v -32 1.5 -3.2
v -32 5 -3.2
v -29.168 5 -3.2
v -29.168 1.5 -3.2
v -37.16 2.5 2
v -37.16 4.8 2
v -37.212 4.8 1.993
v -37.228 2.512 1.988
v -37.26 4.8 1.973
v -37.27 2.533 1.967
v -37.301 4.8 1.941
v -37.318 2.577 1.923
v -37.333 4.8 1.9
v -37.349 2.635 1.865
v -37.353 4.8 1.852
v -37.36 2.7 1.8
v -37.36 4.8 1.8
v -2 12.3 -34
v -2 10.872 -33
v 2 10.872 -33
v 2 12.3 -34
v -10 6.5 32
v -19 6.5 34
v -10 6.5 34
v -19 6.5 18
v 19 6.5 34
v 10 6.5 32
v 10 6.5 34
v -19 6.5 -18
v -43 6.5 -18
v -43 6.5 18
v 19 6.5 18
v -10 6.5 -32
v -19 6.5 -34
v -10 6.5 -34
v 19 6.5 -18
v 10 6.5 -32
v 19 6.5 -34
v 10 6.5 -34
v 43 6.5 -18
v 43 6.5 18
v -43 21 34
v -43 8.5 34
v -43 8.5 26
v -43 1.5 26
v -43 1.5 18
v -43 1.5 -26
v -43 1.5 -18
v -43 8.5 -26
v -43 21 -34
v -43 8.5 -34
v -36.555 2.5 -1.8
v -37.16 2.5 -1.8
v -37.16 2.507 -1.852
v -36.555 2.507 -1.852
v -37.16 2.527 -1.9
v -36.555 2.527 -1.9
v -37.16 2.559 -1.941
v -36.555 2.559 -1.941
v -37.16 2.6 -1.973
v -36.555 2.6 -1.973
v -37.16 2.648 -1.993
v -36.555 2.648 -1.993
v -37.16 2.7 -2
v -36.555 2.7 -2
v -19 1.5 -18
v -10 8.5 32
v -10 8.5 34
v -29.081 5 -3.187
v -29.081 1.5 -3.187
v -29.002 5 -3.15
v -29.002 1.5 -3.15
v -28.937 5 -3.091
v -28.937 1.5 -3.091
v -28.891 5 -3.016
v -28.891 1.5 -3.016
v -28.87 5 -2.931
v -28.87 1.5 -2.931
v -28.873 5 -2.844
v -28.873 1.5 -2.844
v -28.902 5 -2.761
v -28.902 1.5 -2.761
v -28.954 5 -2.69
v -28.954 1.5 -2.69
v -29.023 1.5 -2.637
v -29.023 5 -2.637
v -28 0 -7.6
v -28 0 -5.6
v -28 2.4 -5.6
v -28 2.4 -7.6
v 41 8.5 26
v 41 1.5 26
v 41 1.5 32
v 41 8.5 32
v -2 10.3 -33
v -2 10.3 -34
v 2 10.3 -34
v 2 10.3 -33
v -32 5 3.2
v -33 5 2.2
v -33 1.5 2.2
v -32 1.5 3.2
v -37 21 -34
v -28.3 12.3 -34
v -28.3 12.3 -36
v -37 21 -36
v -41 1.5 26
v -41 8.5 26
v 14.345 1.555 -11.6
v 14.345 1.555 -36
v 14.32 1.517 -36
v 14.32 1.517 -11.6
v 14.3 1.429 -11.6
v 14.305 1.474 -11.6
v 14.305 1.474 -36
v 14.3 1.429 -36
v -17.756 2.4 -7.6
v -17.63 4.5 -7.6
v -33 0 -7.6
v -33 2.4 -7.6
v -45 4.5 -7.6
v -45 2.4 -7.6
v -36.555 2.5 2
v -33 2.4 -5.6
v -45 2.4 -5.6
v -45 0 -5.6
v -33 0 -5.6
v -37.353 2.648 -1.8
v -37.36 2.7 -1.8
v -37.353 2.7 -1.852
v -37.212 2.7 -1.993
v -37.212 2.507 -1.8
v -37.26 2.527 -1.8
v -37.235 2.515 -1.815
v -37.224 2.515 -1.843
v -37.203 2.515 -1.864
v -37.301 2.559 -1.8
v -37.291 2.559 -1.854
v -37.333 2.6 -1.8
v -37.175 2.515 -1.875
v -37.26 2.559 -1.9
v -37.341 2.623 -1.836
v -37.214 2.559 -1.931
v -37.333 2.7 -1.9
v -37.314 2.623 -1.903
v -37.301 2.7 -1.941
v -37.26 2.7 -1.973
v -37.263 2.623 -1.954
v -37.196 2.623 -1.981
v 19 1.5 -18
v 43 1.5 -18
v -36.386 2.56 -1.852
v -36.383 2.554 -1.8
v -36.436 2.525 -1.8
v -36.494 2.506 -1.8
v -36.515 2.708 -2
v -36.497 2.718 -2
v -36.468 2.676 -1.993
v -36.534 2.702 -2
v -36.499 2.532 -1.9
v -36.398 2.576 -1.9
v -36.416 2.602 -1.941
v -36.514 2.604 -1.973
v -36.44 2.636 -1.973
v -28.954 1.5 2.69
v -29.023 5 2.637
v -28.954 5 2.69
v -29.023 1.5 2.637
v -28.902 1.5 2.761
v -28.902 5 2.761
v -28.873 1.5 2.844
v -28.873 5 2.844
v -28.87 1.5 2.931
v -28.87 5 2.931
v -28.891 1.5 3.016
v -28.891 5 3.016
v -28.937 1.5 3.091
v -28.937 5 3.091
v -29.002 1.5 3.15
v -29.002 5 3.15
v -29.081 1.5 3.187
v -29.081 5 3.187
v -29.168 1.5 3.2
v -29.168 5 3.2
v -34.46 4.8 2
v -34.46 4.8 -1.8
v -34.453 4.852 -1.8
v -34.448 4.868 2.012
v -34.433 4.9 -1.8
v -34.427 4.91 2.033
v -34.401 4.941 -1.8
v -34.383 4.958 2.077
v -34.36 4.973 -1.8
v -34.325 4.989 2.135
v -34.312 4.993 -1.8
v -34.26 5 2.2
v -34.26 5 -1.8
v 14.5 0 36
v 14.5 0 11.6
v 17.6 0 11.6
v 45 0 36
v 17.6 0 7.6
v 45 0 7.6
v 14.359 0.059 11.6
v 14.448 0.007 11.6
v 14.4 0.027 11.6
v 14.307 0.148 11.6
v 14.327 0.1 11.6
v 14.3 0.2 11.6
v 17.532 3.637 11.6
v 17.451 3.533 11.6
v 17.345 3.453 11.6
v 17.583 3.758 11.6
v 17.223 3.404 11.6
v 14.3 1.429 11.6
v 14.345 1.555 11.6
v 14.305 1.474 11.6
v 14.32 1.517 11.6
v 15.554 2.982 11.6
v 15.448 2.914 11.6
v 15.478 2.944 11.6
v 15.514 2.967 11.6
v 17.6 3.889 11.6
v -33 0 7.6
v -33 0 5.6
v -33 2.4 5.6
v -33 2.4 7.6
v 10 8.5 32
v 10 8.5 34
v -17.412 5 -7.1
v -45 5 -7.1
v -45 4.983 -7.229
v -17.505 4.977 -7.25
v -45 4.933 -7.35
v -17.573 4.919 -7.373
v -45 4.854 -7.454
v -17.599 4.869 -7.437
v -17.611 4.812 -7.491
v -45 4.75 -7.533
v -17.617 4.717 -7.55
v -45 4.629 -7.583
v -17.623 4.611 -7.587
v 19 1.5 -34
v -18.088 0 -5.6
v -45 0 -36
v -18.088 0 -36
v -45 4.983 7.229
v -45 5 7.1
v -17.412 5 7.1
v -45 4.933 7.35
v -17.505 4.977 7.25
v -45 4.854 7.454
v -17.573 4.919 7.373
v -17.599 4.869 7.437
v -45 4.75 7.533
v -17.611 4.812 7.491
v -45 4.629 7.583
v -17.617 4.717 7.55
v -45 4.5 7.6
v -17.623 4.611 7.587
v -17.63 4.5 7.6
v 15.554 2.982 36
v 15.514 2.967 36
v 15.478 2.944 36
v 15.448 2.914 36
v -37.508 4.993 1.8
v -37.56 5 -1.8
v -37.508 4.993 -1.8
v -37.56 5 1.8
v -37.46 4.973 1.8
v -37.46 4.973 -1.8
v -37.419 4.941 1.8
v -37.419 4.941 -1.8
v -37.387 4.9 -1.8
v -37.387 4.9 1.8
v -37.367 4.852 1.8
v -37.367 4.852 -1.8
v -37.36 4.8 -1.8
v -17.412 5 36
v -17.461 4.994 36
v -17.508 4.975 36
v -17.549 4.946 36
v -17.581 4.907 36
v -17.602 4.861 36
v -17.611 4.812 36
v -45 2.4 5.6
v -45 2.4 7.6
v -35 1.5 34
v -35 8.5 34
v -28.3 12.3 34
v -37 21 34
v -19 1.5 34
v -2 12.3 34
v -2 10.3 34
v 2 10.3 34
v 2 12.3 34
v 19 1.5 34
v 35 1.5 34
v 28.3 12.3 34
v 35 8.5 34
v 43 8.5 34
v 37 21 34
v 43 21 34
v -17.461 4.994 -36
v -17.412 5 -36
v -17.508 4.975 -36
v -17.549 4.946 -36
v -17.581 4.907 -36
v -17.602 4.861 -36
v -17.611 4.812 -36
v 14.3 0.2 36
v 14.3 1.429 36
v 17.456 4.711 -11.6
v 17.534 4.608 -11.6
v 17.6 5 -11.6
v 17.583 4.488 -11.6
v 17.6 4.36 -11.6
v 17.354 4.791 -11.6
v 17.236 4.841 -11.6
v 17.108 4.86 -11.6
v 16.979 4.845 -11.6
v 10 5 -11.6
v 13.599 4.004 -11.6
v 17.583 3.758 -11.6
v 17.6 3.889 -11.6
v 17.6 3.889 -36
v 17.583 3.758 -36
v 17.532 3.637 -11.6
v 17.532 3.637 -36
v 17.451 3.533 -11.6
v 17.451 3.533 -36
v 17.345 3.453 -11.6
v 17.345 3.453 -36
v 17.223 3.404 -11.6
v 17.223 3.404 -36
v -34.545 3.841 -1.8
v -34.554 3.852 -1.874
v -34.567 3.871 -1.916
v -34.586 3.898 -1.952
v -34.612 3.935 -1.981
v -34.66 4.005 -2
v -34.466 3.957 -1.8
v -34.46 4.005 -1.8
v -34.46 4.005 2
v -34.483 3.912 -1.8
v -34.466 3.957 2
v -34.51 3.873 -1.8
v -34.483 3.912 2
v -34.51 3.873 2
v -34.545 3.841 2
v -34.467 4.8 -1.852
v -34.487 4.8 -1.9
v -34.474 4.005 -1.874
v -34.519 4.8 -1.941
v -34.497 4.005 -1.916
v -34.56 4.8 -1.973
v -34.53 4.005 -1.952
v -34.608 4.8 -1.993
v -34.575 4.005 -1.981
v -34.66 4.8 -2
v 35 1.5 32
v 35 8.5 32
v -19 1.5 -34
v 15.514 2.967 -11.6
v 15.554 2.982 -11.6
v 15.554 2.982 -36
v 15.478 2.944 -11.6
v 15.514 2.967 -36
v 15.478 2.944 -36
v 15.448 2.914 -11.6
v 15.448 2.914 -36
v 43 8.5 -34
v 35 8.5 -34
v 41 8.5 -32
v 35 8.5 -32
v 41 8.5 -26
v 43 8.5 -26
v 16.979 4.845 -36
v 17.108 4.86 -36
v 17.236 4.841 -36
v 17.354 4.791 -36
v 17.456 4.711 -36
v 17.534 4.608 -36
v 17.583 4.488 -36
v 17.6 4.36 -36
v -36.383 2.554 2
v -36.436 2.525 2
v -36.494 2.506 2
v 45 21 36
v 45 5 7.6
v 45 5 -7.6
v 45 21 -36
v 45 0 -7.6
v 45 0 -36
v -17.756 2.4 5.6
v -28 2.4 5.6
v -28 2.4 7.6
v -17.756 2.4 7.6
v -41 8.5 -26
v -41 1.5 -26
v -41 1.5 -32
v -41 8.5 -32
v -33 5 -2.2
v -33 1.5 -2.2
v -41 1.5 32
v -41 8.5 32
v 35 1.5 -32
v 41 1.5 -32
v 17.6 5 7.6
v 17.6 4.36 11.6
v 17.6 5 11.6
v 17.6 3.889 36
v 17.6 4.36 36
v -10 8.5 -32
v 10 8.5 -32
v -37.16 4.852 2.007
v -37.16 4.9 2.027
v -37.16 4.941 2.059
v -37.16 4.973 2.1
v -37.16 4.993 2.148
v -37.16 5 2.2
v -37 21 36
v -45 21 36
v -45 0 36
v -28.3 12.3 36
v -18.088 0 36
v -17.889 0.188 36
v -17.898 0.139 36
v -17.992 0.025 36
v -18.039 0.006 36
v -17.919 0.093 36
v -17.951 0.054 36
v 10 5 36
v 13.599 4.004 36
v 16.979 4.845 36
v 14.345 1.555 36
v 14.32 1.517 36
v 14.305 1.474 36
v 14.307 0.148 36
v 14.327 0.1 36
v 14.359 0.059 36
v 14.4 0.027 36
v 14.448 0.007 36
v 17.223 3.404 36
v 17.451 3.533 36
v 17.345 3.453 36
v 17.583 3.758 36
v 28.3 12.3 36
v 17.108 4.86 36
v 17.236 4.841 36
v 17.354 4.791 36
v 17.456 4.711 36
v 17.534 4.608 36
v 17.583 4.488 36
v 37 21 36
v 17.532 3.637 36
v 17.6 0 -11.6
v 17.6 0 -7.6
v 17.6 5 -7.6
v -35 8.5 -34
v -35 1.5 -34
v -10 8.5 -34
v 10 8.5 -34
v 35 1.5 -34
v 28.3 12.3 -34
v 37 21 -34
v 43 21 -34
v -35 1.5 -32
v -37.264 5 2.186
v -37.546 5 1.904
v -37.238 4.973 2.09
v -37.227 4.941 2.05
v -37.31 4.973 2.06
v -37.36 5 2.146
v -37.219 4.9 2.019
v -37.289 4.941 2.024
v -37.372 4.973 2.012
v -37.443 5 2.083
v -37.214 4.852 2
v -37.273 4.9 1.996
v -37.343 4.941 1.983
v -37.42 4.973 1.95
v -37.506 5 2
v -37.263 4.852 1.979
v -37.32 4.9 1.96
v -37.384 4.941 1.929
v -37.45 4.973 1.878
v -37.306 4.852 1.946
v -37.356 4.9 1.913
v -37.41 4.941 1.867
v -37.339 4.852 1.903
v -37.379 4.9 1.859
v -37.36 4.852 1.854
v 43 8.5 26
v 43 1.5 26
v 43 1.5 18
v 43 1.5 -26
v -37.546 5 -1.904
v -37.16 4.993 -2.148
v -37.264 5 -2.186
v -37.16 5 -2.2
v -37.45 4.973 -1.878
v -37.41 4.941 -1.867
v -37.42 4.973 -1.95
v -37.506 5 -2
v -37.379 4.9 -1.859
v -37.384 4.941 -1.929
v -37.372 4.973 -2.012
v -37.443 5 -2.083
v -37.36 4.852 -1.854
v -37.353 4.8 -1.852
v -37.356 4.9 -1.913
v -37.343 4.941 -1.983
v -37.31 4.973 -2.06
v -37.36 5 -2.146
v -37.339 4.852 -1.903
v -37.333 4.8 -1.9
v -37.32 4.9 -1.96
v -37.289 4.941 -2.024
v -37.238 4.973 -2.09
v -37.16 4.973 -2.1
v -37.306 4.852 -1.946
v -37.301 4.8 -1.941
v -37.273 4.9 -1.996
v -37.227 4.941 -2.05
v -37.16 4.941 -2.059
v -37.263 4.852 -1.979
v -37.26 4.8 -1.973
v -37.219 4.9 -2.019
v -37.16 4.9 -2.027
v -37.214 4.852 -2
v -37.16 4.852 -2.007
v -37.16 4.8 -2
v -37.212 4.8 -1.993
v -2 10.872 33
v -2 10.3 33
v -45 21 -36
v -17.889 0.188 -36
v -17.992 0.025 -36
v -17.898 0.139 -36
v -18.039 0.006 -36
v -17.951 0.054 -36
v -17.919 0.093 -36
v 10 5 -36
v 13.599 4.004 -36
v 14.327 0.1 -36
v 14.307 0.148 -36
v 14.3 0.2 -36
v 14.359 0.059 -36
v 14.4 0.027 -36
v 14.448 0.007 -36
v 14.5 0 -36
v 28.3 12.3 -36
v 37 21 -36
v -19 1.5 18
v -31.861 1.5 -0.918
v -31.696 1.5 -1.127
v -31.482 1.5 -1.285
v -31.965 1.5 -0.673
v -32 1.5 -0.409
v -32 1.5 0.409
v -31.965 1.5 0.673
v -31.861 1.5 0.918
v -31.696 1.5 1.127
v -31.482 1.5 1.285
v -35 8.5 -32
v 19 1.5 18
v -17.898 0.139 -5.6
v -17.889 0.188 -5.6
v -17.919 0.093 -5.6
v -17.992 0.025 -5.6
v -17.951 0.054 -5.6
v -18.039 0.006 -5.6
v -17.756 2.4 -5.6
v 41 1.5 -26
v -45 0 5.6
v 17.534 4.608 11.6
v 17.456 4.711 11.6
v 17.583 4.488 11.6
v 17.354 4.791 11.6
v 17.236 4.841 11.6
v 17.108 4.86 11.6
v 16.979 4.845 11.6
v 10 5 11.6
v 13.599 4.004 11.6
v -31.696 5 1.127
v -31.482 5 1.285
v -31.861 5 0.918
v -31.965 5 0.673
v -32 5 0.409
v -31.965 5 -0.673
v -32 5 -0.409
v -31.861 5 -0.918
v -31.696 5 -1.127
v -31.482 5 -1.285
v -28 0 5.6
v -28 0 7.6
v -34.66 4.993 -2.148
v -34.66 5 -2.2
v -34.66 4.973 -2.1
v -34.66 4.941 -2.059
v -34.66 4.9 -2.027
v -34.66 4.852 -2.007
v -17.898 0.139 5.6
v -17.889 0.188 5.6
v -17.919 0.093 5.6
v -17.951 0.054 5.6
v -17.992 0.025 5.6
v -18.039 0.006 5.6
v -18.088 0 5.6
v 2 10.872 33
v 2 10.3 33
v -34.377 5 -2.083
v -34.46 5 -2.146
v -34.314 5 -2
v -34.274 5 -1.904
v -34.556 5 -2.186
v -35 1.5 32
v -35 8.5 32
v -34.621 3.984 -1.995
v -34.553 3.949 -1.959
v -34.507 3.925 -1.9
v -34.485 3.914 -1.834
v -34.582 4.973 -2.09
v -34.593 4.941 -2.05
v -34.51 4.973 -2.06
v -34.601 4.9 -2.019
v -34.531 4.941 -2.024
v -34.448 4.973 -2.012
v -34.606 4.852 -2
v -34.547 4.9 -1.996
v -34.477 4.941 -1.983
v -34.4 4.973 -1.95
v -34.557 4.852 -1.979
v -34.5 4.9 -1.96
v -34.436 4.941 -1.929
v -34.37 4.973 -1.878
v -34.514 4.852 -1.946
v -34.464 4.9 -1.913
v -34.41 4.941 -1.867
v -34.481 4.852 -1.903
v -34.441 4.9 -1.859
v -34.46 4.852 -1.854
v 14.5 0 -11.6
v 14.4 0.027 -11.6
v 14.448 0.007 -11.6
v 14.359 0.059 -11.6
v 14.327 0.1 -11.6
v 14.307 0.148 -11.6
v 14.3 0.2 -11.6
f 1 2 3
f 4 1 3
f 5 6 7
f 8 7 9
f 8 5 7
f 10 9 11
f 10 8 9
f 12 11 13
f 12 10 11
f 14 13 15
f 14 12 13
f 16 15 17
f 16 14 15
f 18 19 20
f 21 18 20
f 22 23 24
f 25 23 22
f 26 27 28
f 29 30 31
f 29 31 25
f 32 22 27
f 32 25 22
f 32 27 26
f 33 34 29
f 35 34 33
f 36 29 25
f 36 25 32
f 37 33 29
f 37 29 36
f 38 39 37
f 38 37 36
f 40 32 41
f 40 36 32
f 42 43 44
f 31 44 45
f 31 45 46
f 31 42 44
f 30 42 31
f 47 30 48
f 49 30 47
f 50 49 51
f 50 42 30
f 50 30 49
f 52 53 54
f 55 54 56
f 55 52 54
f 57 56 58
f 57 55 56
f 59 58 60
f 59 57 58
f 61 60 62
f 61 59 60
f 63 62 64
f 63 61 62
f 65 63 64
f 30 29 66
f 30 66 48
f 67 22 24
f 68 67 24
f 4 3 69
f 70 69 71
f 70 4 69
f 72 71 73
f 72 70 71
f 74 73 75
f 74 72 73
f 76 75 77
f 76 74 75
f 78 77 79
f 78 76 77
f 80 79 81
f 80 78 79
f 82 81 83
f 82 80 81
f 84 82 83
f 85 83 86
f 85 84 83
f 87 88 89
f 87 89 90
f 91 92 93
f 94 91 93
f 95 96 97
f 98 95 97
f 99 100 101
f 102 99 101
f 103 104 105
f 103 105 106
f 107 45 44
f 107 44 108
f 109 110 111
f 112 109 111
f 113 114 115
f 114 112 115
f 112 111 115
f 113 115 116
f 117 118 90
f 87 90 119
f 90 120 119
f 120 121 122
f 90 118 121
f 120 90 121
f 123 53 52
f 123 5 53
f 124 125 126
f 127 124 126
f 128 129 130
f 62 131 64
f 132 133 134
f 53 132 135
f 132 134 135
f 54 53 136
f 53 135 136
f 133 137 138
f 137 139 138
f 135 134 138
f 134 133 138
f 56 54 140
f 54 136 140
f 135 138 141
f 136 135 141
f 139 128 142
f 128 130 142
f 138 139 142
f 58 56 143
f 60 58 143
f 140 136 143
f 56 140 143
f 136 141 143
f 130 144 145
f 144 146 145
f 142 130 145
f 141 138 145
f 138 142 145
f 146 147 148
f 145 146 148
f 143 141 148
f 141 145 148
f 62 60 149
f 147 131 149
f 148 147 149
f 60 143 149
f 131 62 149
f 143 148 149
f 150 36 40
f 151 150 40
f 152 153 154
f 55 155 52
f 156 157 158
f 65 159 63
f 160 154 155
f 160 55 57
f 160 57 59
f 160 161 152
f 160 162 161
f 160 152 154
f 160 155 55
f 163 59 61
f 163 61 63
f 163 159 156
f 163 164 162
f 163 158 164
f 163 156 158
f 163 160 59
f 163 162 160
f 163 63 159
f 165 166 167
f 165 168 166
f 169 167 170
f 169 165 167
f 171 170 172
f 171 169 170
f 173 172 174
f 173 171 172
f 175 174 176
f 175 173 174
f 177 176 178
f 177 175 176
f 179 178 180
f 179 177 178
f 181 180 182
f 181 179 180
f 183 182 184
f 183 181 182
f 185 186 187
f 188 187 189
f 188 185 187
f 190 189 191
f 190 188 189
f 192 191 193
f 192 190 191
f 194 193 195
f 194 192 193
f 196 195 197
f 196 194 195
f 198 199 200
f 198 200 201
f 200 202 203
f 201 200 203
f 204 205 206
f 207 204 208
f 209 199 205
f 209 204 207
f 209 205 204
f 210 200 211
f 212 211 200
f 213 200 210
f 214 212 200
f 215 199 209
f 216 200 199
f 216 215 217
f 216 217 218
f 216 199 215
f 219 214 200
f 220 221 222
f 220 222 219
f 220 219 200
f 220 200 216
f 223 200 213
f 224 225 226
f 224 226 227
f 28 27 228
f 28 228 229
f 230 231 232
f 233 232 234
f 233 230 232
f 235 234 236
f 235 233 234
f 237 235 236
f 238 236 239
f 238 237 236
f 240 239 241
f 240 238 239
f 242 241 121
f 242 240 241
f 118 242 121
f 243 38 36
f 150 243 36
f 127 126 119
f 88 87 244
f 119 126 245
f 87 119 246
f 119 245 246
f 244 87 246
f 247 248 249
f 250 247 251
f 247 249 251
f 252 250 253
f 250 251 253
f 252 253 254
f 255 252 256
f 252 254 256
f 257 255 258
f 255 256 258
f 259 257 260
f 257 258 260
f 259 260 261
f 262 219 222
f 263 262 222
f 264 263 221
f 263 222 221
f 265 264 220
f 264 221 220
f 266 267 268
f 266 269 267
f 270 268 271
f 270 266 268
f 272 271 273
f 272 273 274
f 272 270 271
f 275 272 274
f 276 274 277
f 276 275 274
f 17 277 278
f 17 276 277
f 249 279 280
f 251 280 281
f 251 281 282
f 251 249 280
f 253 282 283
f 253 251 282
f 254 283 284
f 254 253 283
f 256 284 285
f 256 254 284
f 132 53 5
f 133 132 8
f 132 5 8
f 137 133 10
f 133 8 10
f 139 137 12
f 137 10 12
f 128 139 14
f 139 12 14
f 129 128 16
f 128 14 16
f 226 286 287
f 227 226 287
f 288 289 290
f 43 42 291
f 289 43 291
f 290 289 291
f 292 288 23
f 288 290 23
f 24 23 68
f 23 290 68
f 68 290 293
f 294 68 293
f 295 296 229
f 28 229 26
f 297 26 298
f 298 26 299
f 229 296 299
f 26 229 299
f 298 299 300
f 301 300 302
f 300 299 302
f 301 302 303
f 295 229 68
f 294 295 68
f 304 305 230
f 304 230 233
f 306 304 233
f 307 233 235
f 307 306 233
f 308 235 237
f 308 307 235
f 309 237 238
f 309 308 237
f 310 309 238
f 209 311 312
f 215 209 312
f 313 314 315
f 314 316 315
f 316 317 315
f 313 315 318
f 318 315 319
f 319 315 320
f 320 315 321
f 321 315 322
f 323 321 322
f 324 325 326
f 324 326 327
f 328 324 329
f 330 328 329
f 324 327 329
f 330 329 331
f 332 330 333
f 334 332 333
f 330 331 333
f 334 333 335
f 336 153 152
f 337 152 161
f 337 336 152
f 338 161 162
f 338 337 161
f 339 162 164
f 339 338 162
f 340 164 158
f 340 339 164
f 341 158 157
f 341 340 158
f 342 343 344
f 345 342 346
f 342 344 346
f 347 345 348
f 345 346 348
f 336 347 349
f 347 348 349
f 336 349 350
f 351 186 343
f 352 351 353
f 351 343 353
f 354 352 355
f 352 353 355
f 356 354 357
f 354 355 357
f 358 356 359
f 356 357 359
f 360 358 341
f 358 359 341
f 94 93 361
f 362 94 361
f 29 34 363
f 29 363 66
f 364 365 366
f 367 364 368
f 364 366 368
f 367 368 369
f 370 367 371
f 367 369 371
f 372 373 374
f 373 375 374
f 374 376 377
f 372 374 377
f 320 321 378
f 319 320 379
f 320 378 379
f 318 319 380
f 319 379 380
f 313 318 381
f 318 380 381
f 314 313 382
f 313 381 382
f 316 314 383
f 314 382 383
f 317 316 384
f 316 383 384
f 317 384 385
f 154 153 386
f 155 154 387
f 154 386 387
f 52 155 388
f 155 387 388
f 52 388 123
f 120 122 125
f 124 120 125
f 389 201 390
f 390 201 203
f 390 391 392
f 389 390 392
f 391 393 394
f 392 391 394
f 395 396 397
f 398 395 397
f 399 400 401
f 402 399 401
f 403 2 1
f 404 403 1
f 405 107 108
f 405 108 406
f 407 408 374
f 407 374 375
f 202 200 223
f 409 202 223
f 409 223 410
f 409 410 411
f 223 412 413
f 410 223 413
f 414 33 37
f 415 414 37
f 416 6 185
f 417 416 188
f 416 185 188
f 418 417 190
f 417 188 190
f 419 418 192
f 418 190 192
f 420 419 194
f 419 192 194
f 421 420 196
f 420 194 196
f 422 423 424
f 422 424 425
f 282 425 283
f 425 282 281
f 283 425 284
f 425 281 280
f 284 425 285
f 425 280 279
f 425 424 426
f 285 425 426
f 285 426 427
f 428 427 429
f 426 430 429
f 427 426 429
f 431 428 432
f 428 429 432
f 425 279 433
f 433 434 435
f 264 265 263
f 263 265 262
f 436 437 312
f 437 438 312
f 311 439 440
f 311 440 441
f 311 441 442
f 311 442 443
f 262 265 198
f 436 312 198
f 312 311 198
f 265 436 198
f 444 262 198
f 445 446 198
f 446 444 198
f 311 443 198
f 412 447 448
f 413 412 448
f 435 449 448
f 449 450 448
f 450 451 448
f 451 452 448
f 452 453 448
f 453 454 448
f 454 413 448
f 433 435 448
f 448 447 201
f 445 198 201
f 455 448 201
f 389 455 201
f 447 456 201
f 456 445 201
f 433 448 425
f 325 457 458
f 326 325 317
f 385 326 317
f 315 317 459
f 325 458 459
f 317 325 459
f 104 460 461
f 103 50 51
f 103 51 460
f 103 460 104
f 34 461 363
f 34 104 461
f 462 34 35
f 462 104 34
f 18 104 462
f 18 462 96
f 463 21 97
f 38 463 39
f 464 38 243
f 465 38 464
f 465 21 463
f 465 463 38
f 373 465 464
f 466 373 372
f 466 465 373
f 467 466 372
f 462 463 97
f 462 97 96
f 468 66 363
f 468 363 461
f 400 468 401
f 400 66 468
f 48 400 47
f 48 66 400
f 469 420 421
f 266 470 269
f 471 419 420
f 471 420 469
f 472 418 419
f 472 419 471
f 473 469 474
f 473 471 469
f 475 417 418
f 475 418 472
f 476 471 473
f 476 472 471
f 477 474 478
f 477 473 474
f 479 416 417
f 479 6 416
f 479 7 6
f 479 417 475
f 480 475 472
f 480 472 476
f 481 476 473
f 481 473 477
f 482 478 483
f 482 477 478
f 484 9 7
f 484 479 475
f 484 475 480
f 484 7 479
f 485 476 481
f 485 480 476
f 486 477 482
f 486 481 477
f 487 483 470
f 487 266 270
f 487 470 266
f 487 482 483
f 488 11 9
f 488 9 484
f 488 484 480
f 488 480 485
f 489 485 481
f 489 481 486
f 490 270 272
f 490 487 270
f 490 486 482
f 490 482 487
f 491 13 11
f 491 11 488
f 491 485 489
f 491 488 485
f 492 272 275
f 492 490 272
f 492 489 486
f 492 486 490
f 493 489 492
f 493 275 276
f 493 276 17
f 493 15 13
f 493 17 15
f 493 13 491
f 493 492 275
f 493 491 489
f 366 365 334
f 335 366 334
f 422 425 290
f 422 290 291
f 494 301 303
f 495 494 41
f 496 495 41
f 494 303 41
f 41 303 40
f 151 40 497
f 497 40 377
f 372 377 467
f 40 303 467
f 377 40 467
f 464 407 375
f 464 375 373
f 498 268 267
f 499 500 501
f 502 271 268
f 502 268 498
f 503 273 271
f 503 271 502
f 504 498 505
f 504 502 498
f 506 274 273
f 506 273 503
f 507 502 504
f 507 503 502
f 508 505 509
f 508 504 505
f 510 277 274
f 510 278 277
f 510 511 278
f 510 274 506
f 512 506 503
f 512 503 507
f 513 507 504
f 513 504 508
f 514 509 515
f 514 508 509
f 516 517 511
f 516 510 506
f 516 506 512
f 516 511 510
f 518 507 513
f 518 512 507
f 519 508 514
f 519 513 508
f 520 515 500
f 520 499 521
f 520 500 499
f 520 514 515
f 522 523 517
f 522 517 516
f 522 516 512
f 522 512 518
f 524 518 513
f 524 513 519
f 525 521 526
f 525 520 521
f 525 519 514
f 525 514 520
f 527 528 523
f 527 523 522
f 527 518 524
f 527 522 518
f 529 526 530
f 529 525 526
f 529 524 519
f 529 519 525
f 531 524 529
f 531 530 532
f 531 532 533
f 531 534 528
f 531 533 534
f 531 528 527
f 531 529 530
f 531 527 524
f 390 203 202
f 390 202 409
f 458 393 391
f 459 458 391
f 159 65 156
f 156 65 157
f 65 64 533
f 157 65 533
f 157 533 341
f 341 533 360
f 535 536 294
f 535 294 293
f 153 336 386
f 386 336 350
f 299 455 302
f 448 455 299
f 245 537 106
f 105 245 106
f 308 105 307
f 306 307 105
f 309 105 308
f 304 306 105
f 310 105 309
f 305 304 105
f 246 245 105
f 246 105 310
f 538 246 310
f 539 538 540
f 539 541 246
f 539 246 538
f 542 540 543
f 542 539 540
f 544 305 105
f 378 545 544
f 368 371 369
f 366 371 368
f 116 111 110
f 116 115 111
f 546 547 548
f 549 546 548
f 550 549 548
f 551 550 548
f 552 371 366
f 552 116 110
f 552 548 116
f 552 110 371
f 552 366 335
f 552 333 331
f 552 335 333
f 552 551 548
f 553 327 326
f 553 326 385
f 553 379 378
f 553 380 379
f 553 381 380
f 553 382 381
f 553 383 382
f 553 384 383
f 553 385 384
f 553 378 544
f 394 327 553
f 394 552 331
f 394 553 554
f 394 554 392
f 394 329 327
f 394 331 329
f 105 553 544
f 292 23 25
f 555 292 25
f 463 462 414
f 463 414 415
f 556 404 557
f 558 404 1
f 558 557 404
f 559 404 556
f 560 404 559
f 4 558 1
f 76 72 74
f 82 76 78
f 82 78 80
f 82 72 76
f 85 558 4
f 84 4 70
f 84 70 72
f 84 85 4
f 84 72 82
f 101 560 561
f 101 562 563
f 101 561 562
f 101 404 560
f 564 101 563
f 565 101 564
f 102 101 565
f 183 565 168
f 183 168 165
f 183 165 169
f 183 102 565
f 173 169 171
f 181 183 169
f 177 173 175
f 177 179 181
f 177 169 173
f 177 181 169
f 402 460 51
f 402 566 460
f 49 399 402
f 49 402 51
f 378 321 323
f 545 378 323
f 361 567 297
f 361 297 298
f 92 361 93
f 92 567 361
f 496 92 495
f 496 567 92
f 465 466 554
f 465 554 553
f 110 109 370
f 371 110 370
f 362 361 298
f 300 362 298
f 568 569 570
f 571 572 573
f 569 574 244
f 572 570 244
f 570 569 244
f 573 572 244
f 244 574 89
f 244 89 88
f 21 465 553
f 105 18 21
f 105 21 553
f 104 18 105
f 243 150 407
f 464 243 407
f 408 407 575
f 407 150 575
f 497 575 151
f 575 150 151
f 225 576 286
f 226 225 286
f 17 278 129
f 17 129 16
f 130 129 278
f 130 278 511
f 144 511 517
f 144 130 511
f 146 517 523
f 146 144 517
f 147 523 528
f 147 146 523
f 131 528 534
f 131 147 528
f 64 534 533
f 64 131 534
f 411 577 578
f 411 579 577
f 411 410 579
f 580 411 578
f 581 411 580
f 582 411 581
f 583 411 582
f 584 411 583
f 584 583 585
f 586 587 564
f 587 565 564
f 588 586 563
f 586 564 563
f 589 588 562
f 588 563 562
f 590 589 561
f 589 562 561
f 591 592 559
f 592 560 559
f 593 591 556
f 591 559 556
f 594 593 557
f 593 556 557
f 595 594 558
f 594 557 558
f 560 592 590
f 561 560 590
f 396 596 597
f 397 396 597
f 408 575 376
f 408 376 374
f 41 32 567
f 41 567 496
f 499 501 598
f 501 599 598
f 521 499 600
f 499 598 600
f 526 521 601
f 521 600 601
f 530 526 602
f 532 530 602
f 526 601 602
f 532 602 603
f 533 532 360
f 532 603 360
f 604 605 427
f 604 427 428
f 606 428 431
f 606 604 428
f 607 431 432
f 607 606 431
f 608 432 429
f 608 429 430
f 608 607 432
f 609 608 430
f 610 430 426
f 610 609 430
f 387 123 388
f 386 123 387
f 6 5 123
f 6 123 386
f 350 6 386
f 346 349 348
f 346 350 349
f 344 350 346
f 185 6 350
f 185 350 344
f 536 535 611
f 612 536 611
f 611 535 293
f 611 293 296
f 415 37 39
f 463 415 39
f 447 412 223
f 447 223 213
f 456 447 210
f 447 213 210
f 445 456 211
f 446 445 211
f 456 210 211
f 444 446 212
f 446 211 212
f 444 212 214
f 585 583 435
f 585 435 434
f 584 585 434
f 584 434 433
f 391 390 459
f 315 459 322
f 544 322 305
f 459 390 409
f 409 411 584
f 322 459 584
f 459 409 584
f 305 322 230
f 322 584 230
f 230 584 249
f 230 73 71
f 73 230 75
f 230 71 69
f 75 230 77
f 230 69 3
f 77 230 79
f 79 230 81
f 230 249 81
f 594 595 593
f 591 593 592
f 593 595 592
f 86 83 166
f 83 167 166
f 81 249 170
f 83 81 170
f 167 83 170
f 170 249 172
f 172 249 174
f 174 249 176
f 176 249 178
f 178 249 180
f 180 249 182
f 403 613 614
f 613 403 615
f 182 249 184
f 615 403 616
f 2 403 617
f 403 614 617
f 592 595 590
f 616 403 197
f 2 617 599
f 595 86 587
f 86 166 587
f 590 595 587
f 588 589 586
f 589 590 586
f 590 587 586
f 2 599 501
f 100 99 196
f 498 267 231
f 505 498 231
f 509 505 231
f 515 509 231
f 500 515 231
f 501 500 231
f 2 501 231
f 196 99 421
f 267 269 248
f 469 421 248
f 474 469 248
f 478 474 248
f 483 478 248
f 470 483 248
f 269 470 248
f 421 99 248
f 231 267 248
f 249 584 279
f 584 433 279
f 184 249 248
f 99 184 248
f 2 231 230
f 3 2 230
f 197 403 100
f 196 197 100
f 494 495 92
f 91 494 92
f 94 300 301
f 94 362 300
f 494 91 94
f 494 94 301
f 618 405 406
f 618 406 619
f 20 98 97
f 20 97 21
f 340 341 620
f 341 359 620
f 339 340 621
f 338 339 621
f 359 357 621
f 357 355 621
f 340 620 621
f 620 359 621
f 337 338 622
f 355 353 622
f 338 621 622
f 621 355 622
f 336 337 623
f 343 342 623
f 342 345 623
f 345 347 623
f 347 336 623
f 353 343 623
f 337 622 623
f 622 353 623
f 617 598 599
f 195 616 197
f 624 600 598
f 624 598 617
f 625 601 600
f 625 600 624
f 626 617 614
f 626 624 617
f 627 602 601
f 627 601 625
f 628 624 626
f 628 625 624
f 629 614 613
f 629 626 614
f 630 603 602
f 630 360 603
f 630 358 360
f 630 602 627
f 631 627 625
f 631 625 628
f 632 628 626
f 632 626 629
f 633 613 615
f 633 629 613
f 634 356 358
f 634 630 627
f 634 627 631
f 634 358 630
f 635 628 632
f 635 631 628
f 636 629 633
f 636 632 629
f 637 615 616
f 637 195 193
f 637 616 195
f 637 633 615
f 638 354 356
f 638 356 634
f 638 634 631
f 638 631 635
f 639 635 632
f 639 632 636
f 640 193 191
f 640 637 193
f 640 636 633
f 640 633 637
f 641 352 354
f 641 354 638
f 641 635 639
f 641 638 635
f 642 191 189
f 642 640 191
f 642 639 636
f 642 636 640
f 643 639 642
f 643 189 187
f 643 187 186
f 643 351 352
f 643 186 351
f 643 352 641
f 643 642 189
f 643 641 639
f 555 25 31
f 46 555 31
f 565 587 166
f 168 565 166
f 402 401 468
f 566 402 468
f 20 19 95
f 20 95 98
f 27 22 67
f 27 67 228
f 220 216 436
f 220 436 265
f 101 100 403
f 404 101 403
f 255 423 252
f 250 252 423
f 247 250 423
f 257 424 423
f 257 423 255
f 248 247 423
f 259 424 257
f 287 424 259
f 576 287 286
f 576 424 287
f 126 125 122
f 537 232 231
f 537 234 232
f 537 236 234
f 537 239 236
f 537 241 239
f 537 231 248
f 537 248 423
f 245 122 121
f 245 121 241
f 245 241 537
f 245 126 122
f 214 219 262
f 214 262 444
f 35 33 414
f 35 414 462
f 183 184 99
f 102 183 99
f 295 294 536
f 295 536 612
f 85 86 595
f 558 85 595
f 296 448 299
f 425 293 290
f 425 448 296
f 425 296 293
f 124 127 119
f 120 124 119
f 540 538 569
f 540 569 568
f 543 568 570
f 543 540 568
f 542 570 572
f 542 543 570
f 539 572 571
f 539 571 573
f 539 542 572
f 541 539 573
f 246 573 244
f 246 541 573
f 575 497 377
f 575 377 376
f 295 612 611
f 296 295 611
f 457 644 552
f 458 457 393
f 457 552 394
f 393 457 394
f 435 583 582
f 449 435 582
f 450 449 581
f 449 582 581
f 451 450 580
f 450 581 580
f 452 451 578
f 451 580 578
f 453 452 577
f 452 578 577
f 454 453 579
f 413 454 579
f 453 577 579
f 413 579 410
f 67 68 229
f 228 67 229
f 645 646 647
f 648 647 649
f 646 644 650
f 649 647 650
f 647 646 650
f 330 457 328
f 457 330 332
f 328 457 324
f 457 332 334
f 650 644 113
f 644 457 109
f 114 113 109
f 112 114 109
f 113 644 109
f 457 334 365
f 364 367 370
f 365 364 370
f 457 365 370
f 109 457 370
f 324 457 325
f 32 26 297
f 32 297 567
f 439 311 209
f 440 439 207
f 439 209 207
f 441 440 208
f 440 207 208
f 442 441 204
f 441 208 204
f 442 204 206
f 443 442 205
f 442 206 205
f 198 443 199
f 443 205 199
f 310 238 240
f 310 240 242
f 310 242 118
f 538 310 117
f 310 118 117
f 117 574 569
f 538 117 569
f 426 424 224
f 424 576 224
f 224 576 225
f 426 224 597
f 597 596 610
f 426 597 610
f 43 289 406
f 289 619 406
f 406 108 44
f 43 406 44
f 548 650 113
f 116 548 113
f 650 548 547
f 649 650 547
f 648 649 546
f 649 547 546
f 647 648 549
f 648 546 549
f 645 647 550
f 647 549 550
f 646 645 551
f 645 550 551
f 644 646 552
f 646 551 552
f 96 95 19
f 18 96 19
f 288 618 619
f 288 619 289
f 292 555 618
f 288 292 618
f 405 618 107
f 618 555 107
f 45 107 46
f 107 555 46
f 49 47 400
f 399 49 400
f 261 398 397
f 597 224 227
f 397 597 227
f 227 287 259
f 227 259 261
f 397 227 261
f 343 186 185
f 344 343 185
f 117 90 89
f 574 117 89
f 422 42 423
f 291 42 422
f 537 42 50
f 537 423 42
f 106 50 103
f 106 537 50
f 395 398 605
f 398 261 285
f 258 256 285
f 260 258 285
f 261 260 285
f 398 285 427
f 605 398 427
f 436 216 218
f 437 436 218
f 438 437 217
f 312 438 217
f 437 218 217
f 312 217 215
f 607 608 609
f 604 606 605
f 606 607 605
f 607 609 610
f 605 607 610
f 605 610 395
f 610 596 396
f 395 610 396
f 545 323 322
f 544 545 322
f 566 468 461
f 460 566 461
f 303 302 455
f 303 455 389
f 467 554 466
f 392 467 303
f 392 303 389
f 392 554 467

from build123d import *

# Parameters (mm, degrees)
SKETCH_1_W                  = 90
SKETCH_1_H                  = 72
EXTRUDE_1_DEPTH             = 21
CUT_EXTRUDE_1_DEPTH         = 72
FILLET_1_R                  = 0.5
FILLET_2_R                  = 0.2
CUT_EXTRUDE_2_DEPTH         = 28
SKETCH_6_W                  = 5
SKETCH_6_H                  = 2
CUT_EXTRUDE_3_DEPTH         = 2.4
FILLET_3_R                  = 0.5
EXTRUDE_2_DEPTH             = 3.5
FILLET_4_R                  = 1
FILLET_5_R                  = 0.3
CHAMFER_1_SIZE              = 1
SKETCH_8_W                  = 2.9
SKETCH_8_H                  = 4
EXTRUDE_3_DEPTH             = 2.5
CHAMFER_2_SIZE              = 2
CHAMFER_2_SIZE2             = 1.400415076
FILLET_6_R                  = 0.2
FILLET_7_R                  = 0.3
FILLET_8_R                  = 0.2
SKETCH_9_W                  = 15.2
SKETCH_9_H                  = 5
CUT_EXTRUDE_4_DEPTH         = 36
SKETCH_10_W                 = 7.6
SKETCH_10_H                 = 5
CUT_EXTRUDE_5_DEPTH         = 4
CUT_EXTRUDE_6_DEPTH         = 72
SKETCH_12_W                 = 86
SKETCH_12_H                 = 68
CUT_EXTRUDE_7_DEPTH         = 14.5
SKETCH_13_W                 = 24
SKETCH_13_H                 = 16
CUT_EXTRUDE_8_DEPTH         = 5
MIRROR_4_COPY_1_SKETCH_W    = 24
MIRROR_4_COPY_1_SKETCH_H    = 16
MIRROR_4_COPY_1_DEPTH       = 5
EXTRUDE_4_DEPTH             = 7
MIRROR_6_COPY_1_DEPTH       = 7
SKETCH_15_W                 = 20
SKETCH_15_H                 = 2
EXTRUDE_5_DEPTH             = 2
SKETCH_17_W                 = 4
SKETCH_17_H                 = 2
EXTRUDE_6_DEPTH             = 1
CHAMFER_3_SIZE              = 1
CHAMFER_3_SIZE2             = 1.428148007
CHAMFER_3_OF_MIRROR_8_SIZE2 = 1.428148007
CHAMFER_3_OF_MIRROR_8_SIZE  = 1


with BuildPart() as part:
    # 草图1 → 凸台-拉伸1 (new body)
    with BuildSketch(Plane(origin=(0, 0, 0), x_dir=(1, 0, 0), z_dir=(0, 1, 0))):
        Rectangle(SKETCH_1_W, SKETCH_1_H)
    extrude(amount=EXTRUDE_1_DEPTH)

    # 草图4 → 切除-拉伸1 (cut)
    with BuildSketch(Plane.XY.offset(36)):
        Polygon((14.3, 0), (14.3, 1.5), (15.489963906, 2.965295015), (17.6, 3.5), (17.6, 5), (13.598917425, 4.003578801), (10, 5), (-17.6, 5), (-17.9, 0), align=None)
    extrude(amount=-CUT_EXTRUDE_1_DEPTH, mode=Mode.SUBTRACT)

    # 圆角1
    fillet_1_edges = [part.edges().sort_by_distance(p)[0] for p in [
        (17.6, 5, 0),
        (17.6, 3.5, 0),
    ]]
    fillet(fillet_1_edges, radius=FILLET_1_R)

    # 圆角2
    fillet_2_edges = [part.edges().sort_by_distance(p)[0] for p in [
        (14.3, 0, 0),
        (-17.9, 0, 0),
        (-17.6, 5, 0),
        (15.489963906, 2.965295015, 0),
        (14.3, 1.5, 0),
    ]]
    fillet(fillet_2_edges, radius=FILLET_2_R)

    # 草图5 → 切除-拉伸2 (cut)
    with BuildSketch(Plane.ZY.offset(45)):
        Polygon((5.6, 0), (5.6, 2.4), (7.6, 2.4), (7.6, 5), (-7.6, 5), (-7.6, 2.4), (-5.6, 2.4), (-5.6, 0), align=None)
    extrude(amount=-CUT_EXTRUDE_2_DEPTH, mode=Mode.SUBTRACT)

    # 草图6 → 切除-拉伸3 (cut)
    with BuildSketch(Plane.XZ):
        with Locations((-30.5, 6.6)):
            Rectangle(SKETCH_6_W, SKETCH_6_H)
    cut_extrude_3 = extrude(amount=-CUT_EXTRUDE_3_DEPTH, mode=Mode.SUBTRACT)

    # 镜向1: 切除-拉伸3 across plane
    add(cut_extrude_3.mirror(Plane(origin=(0, 0, 0), x_dir=(1, 0, 0), z_dir=(0, 0, -1))), mode=Mode.SUBTRACT)

    # 圆角3
    fillet_3_edges = [part.edges().sort_by_distance(p)[0] for p in [
        (-31.205820162, 5, -7.6),
        (-31.205820162, 5, 7.6),
    ]]
    fillet(fillet_3_edges, radius=FILLET_3_R)

    # 草图7 → 凸台-拉伸2 (add)
    with BuildSketch(Plane.XZ.offset(-5)):
        Polygon((-33, 3.2), (-33, -3.2), (-28, -3.2), (-32, -1), (-32, 1), (-28, 3.2), align=None)
    extrude(amount=EXTRUDE_2_DEPTH)

    # 圆角4
    fillet_4_edges = [part.edges().sort_by_distance(p)[0] for p in [
        (-32, 3.25, -1),
        (-32, 3.25, 1),
    ]]
    fillet(fillet_4_edges, radius=FILLET_4_R)

    # 圆角5
    fillet_5_edges = [part.edges().sort_by_distance(p)[0] for p in [
        (-28, 3.25, 3.2),
        (-28, 3.25, -3.2),
    ]]
    fillet(fillet_5_edges, radius=FILLET_5_R)

    # 倒角1
    chamfer_1_edges = [part.edges().sort_by_distance(p)[0] for p in [
        (-33, 3.25, 3.2),
        (-33, 3.25, -3.2),
    ]]
    chamfer(chamfer_1_edges, length=CHAMFER_1_SIZE)

    # 草图8 → 凸台-拉伸3 (add)
    with BuildSketch(Plane.XZ.offset(-5)):
        with Locations((-35.91, 0)):
            Rectangle(SKETCH_8_W, SKETCH_8_H)
    extrude(amount=EXTRUDE_3_DEPTH)

    # 倒角2
    chamfer_2_edges = [part.edges().sort_by_distance(p)[0] for p in [
        (-34.46, 2.5, 0),
    ]]
    chamfer_2_side = [part.faces().sort_by_distance(p)[0] for p in [
        (-35.91, 2.5, 0),
    ]]
    chamfer(chamfer_2_edges, length=CHAMFER_2_SIZE, length2=CHAMFER_2_SIZE2, reference=chamfer_2_side[0])

    # 圆角6
    fillet_6_edges = [part.edges().sort_by_distance(p)[0] for p in [
        (-37.36, 5, 0),
        (-37.36, 3.75, 2),
        (-35.91, 5, -2),
        (-37.36, 3.75, -2),
        (-34.46, 5, 0),
        (-35.91, 5, 2),
        (-37.36, 2.5, 0),
        (-36.91, 2.5, -2),
        (-34.46, 4.450207538, -2),
        (-35.46, 3.200207538, -2),
    ]]
    fillet(fillet_6_edges, radius=FILLET_6_R)

    # 圆角7
    # the kernel refuses this fillet: 0.3 mm, written as the material it takes off along each edge
    with BuildSketch(Plane(origin=(-36.554589637, 2.8, -2), x_dir=(0.5735764363510475, -0.8191520442889909, 0), z_dir=(0.8191520442889909, 0.5735764363510475, 0))) as fillet_7_piece_1:
        with BuildLine():
            CenterArc((0.1, -0.2), 0.2, 0, 90)
            Line((0.3, -0.2), (0.3, 0))
            Line((0.3, 0), (0.1, 0))
        make_face()
    revolve(axis=Axis((-36.554589637, 2.8, -2), (0, 0, -1)), revolution_arc=35, mode=Mode.SUBTRACT)
    with BuildSketch(Plane(origin=(-36.46, 2.5, 2.236474092), x_dir=(0.8191520442890007, 0.5735764363510335, 0), z_dir=(0, 0, -1))) as fillet_7_piece_2:
        with BuildLine():
            CenterArc((FILLET_7_R * 0.315298788879, -FILLET_7_R), FILLET_7_R, 90, 35)
            Line((-FILLET_7_R * 0.258277647472, -FILLET_7_R * 0.180847955711), (0, 0))
            Line((0, 0), (FILLET_7_R * 0.315298788879, 0))
        make_face()
    extrude(amount=4.236474092, mode=Mode.SUBTRACT)

    # 圆角8
    fillet_8_edges = [part.edges().sort_by_distance(p)[0] for p in [
        (-34.46, 3.900415076, 0.1),
        (-34.522857251, 3.93313649, -1.945574265),
    ]]
    fillet(fillet_8_edges, radius=FILLET_8_R)

    # 草图9 → 切除-拉伸4 (cut)
    with BuildSketch(Plane(origin=(45, 0, 0), x_dir=(0, 0, -1), z_dir=(1, 0, 0))):
        with Locations((0, 2.5)):
            Rectangle(SKETCH_9_W, SKETCH_9_H)
    extrude(amount=-CUT_EXTRUDE_4_DEPTH, mode=Mode.SUBTRACT)

    # 草图10 → 切除-拉伸5 (cut)
    with BuildSketch(Plane(origin=(0, 0, 7.6), x_dir=(-1, 0, 0), z_dir=(0, 0, -1))):
        with Locations((-13.8, 2.5)):
            Rectangle(SKETCH_10_W, SKETCH_10_H)
    cut_extrude_5 = extrude(amount=-CUT_EXTRUDE_5_DEPTH, mode=Mode.SUBTRACT)

    # 镜向2: 切除-拉伸5 across plane
    add(cut_extrude_5.mirror(Plane(origin=(0, 0, 0), x_dir=(1, 0, 0), z_dir=(0, 0, -1))), mode=Mode.SUBTRACT)

    # 草图11 → 切除-拉伸6 (cut)
    with BuildSketch(Plane.XY.offset(36)):
        Polygon((-37, 21), (37, 21), (28.3, 12.3), (-28.3, 12.3), align=None)
    extrude(amount=-CUT_EXTRUDE_6_DEPTH, mode=Mode.SUBTRACT)

    # 草图12 → 切除-拉伸7 (cut)
    with BuildSketch(Plane(origin=(0, 21, 0), x_dir=(1, 0, 0), z_dir=(0, 1, 0))):
        Rectangle(SKETCH_12_W, SKETCH_12_H)
    extrude(amount=-CUT_EXTRUDE_7_DEPTH, mode=Mode.SUBTRACT)

    # 草图13 → 切除-拉伸8 (cut)
    with BuildSketch(Plane(origin=(0, 6.5, 0), x_dir=(1, 0, 0), z_dir=(0, 1, 0))):
        with Locations((31, -26)):
            Rectangle(SKETCH_13_W, SKETCH_13_H)
    cut_extrude_8 = extrude(amount=-CUT_EXTRUDE_8_DEPTH, mode=Mode.SUBTRACT)

    # 镜向3: 切除-拉伸8 across plane
    add(cut_extrude_8.mirror(Plane(origin=(0, 0, 0), x_dir=(1, 0, 0), z_dir=(0, 0, -1))), mode=Mode.SUBTRACT)

    # 镜向4: 切除-拉伸8 across plane
    add(cut_extrude_8.mirror(Plane.ZY), mode=Mode.SUBTRACT)

    # 镜向4 copy 1 sketch → 镜向4 copy 1 (cut)
    with BuildSketch(Plane(origin=(0, 6.5, 0), x_dir=(-1, 0, 0), z_dir=(0, 1, 0))):
        with Locations((31, -26)):
            Rectangle(MIRROR_4_COPY_1_SKETCH_W, MIRROR_4_COPY_1_SKETCH_H)
    extrude(amount=-MIRROR_4_COPY_1_DEPTH, mode=Mode.SUBTRACT)

    # 草图14 → 凸台-拉伸4 (add)
    with BuildSketch(Plane(origin=(0, 1.5, 0), x_dir=(1, 0, 0), z_dir=(0, 1, 0))):
        Polygon((35, -34), (43, -34), (43, -26), (41, -26), (41, -32), (35, -32), align=None)
    extrude_4 = extrude(amount=EXTRUDE_4_DEPTH)

    # 镜向5: 凸台-拉伸4 across plane
    add(extrude_4.mirror(Plane(origin=(0, 0, 0), x_dir=(1, 0, 0), z_dir=(0, 0, -1))))

    # 镜向6: 凸台-拉伸4 across plane
    add(extrude_4.mirror(Plane.ZY))

    # 镜向6 copy 1 sketch → 镜向6 copy 1 (add)
    with BuildSketch(Plane(origin=(0, 1.5, 0), x_dir=(-1, 0, 0), z_dir=(0, 1, 0))):
        Polygon((35, -34), (43, -34), (43, -26), (41, -26), (41, -32), (35, -32), align=None)
    extrude(amount=MIRROR_6_COPY_1_DEPTH)

    # 草图15 → 凸台-拉伸5 (add)
    with BuildSketch(Plane(origin=(0, 6.5, 0), x_dir=(1, 0, 0), z_dir=(0, 1, 0))):
        with Locations((0, 33)):
            Rectangle(SKETCH_15_W, SKETCH_15_H)
    extrude_5 = extrude(amount=EXTRUDE_5_DEPTH)

    # 镜向7: 凸台-拉伸5 across plane
    add(extrude_5.mirror(Plane(origin=(0, 0, 0), x_dir=(1, 0, 0), z_dir=(0, 0, -1))))

    # 草图17 → 凸台-拉伸6 (add)
    with BuildSketch(Plane.XY.offset(-34)):
        with Locations((0, 11.3)):
            Rectangle(SKETCH_17_W, SKETCH_17_H)
    extrude_6 = extrude(amount=EXTRUDE_6_DEPTH)

    # 倒角3
    chamfer_3_edges = [part.edges().sort_by_distance(p)[0] for p in [
        (0, 12.3, -33),
    ]]
    chamfer_3_side = [part.faces().sort_by_distance(p)[0] for p in [
        (0, 12.3, -34.948805461),
    ]]
    chamfer(chamfer_3_edges, length=CHAMFER_3_SIZE, length2=CHAMFER_3_SIZE2, reference=chamfer_3_side[0])

    # 镜向8: 凸台-拉伸6 across plane
    add(extrude_6.mirror(Plane(origin=(0, 0, 0), x_dir=(1, 0, 0), z_dir=(0, 0, -1))))

    # 倒角3 of 镜向8
    chamfer_3_of_mirror_8_edges = [part.edges().sort_by_distance(p)[0] for p in [
        (0, 12.3, 33),
    ]]
    chamfer(chamfer_3_of_mirror_8_edges, length=CHAMFER_3_OF_MIRROR_8_SIZE, length2=CHAMFER_3_OF_MIRROR_8_SIZE2)


solid = part.part
